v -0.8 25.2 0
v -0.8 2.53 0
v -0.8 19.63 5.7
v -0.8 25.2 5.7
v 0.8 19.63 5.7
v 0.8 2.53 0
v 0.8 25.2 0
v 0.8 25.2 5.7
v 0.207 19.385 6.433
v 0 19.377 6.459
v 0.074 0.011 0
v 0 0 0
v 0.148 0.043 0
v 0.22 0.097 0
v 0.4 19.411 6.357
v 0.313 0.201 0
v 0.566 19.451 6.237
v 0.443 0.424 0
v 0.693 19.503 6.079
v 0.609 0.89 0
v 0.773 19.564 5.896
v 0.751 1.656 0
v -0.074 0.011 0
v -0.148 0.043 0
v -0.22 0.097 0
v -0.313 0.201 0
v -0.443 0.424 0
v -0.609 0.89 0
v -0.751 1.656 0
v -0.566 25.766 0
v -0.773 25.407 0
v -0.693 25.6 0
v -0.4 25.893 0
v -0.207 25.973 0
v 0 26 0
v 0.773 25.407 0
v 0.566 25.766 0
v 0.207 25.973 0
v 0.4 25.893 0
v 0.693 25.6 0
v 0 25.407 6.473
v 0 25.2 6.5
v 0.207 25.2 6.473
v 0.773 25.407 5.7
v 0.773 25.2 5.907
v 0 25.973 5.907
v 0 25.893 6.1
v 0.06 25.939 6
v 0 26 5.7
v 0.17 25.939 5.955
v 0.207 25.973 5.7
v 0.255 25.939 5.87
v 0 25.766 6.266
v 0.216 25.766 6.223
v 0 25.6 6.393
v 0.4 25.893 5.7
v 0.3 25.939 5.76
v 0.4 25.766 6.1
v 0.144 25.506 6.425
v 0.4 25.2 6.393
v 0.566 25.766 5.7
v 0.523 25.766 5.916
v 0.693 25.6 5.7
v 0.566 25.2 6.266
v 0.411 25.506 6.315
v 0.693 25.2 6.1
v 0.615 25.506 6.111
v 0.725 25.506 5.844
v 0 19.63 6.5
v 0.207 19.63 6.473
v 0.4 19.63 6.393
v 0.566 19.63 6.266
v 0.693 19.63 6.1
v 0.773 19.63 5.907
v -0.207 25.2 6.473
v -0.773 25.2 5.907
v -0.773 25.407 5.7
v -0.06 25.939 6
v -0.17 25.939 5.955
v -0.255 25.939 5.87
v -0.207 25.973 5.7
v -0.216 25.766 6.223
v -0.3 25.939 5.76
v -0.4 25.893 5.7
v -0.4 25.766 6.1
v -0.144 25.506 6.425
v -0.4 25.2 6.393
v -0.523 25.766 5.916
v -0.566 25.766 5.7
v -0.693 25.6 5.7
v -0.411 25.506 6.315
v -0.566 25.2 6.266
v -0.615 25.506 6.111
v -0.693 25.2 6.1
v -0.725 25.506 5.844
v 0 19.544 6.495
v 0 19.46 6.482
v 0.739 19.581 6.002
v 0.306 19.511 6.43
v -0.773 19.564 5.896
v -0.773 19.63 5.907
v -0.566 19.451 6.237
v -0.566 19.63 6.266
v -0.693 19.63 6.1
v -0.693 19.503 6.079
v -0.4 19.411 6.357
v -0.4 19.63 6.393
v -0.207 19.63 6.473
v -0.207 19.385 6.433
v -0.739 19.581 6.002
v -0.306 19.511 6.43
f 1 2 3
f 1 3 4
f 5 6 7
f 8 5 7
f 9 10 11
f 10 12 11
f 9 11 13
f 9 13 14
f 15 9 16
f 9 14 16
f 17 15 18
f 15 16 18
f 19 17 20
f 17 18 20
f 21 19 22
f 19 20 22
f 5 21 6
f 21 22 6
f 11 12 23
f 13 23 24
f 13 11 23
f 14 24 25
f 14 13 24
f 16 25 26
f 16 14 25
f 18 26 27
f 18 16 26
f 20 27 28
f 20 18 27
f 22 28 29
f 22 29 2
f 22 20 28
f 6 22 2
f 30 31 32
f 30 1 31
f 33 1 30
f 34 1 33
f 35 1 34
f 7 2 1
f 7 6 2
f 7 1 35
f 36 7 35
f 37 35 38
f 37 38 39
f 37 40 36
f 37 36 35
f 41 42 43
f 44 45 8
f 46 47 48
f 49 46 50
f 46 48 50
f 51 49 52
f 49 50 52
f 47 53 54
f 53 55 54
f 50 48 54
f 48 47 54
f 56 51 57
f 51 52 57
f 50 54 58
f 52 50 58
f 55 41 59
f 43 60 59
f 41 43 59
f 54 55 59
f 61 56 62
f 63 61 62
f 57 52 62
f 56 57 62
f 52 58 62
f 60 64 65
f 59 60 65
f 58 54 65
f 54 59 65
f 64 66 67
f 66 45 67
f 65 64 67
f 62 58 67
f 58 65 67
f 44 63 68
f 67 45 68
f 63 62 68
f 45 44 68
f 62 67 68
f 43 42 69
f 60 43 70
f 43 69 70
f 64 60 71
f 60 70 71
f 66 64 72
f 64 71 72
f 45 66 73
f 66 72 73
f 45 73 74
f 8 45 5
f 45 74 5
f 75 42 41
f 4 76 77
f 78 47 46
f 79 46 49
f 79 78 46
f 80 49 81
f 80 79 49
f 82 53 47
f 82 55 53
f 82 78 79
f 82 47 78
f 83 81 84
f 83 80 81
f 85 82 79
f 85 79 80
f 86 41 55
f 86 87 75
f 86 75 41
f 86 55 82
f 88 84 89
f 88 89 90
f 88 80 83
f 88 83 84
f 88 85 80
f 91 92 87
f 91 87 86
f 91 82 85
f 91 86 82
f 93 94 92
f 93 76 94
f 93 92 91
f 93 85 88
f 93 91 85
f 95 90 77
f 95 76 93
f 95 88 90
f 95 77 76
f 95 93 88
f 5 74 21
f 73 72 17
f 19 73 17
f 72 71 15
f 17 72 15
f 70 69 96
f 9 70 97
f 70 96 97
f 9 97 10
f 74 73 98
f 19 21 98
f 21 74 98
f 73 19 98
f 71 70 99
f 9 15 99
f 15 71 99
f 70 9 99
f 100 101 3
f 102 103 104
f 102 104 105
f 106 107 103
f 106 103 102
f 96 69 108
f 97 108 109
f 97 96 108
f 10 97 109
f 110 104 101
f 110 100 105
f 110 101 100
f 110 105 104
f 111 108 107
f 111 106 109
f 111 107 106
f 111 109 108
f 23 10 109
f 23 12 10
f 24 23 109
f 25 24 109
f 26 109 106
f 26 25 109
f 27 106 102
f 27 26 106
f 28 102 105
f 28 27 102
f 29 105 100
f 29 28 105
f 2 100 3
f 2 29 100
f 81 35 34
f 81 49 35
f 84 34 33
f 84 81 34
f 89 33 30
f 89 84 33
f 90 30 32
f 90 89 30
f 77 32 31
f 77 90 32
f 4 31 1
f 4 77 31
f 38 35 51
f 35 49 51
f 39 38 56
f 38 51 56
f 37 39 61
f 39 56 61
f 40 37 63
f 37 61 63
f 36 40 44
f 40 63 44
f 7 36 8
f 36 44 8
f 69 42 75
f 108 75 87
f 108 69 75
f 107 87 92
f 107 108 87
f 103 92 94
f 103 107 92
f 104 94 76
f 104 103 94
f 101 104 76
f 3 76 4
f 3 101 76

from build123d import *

# Parameters (mm, degrees)
F1_DEPTH = 0.8
F2_R     = 0.79999


# Not quite as in the source:
# - a fillet or chamfer is up to 0.001 mm smaller than in the source, because OpenCascade refuses the exact size


with BuildPart() as f1:
    # F0 (on Right) → F1 (new body, symmetric)
    with BuildSketch(Plane.YZ):
        Polygon((19.5, 6.5), (0, 0), (26, 0), (26, 6.5), align=None)
    extrude(amount=F1_DEPTH, both=True)

    # F2 (radius 0.8 in the source; OpenCascade refuses exactly that, so slightly less here)
    f2_edges = [f1.edges().sort_by_distance(p)[0] for p in [
        (0.8, 22.75, 6.5),
        (0.8, 9.75, 3.25),
        (-0.8, 22.75, 6.5),
        (-0.8, 9.75, 3.25),
        (0, 19.5, 6.5),
        (0, 26, 6.5),
        (0.8, 26, 3.25),
        (-0.8, 26, 3.25),
    ]]
    fillet(f2_edges, radius=F2_R)


solid = f1.part
